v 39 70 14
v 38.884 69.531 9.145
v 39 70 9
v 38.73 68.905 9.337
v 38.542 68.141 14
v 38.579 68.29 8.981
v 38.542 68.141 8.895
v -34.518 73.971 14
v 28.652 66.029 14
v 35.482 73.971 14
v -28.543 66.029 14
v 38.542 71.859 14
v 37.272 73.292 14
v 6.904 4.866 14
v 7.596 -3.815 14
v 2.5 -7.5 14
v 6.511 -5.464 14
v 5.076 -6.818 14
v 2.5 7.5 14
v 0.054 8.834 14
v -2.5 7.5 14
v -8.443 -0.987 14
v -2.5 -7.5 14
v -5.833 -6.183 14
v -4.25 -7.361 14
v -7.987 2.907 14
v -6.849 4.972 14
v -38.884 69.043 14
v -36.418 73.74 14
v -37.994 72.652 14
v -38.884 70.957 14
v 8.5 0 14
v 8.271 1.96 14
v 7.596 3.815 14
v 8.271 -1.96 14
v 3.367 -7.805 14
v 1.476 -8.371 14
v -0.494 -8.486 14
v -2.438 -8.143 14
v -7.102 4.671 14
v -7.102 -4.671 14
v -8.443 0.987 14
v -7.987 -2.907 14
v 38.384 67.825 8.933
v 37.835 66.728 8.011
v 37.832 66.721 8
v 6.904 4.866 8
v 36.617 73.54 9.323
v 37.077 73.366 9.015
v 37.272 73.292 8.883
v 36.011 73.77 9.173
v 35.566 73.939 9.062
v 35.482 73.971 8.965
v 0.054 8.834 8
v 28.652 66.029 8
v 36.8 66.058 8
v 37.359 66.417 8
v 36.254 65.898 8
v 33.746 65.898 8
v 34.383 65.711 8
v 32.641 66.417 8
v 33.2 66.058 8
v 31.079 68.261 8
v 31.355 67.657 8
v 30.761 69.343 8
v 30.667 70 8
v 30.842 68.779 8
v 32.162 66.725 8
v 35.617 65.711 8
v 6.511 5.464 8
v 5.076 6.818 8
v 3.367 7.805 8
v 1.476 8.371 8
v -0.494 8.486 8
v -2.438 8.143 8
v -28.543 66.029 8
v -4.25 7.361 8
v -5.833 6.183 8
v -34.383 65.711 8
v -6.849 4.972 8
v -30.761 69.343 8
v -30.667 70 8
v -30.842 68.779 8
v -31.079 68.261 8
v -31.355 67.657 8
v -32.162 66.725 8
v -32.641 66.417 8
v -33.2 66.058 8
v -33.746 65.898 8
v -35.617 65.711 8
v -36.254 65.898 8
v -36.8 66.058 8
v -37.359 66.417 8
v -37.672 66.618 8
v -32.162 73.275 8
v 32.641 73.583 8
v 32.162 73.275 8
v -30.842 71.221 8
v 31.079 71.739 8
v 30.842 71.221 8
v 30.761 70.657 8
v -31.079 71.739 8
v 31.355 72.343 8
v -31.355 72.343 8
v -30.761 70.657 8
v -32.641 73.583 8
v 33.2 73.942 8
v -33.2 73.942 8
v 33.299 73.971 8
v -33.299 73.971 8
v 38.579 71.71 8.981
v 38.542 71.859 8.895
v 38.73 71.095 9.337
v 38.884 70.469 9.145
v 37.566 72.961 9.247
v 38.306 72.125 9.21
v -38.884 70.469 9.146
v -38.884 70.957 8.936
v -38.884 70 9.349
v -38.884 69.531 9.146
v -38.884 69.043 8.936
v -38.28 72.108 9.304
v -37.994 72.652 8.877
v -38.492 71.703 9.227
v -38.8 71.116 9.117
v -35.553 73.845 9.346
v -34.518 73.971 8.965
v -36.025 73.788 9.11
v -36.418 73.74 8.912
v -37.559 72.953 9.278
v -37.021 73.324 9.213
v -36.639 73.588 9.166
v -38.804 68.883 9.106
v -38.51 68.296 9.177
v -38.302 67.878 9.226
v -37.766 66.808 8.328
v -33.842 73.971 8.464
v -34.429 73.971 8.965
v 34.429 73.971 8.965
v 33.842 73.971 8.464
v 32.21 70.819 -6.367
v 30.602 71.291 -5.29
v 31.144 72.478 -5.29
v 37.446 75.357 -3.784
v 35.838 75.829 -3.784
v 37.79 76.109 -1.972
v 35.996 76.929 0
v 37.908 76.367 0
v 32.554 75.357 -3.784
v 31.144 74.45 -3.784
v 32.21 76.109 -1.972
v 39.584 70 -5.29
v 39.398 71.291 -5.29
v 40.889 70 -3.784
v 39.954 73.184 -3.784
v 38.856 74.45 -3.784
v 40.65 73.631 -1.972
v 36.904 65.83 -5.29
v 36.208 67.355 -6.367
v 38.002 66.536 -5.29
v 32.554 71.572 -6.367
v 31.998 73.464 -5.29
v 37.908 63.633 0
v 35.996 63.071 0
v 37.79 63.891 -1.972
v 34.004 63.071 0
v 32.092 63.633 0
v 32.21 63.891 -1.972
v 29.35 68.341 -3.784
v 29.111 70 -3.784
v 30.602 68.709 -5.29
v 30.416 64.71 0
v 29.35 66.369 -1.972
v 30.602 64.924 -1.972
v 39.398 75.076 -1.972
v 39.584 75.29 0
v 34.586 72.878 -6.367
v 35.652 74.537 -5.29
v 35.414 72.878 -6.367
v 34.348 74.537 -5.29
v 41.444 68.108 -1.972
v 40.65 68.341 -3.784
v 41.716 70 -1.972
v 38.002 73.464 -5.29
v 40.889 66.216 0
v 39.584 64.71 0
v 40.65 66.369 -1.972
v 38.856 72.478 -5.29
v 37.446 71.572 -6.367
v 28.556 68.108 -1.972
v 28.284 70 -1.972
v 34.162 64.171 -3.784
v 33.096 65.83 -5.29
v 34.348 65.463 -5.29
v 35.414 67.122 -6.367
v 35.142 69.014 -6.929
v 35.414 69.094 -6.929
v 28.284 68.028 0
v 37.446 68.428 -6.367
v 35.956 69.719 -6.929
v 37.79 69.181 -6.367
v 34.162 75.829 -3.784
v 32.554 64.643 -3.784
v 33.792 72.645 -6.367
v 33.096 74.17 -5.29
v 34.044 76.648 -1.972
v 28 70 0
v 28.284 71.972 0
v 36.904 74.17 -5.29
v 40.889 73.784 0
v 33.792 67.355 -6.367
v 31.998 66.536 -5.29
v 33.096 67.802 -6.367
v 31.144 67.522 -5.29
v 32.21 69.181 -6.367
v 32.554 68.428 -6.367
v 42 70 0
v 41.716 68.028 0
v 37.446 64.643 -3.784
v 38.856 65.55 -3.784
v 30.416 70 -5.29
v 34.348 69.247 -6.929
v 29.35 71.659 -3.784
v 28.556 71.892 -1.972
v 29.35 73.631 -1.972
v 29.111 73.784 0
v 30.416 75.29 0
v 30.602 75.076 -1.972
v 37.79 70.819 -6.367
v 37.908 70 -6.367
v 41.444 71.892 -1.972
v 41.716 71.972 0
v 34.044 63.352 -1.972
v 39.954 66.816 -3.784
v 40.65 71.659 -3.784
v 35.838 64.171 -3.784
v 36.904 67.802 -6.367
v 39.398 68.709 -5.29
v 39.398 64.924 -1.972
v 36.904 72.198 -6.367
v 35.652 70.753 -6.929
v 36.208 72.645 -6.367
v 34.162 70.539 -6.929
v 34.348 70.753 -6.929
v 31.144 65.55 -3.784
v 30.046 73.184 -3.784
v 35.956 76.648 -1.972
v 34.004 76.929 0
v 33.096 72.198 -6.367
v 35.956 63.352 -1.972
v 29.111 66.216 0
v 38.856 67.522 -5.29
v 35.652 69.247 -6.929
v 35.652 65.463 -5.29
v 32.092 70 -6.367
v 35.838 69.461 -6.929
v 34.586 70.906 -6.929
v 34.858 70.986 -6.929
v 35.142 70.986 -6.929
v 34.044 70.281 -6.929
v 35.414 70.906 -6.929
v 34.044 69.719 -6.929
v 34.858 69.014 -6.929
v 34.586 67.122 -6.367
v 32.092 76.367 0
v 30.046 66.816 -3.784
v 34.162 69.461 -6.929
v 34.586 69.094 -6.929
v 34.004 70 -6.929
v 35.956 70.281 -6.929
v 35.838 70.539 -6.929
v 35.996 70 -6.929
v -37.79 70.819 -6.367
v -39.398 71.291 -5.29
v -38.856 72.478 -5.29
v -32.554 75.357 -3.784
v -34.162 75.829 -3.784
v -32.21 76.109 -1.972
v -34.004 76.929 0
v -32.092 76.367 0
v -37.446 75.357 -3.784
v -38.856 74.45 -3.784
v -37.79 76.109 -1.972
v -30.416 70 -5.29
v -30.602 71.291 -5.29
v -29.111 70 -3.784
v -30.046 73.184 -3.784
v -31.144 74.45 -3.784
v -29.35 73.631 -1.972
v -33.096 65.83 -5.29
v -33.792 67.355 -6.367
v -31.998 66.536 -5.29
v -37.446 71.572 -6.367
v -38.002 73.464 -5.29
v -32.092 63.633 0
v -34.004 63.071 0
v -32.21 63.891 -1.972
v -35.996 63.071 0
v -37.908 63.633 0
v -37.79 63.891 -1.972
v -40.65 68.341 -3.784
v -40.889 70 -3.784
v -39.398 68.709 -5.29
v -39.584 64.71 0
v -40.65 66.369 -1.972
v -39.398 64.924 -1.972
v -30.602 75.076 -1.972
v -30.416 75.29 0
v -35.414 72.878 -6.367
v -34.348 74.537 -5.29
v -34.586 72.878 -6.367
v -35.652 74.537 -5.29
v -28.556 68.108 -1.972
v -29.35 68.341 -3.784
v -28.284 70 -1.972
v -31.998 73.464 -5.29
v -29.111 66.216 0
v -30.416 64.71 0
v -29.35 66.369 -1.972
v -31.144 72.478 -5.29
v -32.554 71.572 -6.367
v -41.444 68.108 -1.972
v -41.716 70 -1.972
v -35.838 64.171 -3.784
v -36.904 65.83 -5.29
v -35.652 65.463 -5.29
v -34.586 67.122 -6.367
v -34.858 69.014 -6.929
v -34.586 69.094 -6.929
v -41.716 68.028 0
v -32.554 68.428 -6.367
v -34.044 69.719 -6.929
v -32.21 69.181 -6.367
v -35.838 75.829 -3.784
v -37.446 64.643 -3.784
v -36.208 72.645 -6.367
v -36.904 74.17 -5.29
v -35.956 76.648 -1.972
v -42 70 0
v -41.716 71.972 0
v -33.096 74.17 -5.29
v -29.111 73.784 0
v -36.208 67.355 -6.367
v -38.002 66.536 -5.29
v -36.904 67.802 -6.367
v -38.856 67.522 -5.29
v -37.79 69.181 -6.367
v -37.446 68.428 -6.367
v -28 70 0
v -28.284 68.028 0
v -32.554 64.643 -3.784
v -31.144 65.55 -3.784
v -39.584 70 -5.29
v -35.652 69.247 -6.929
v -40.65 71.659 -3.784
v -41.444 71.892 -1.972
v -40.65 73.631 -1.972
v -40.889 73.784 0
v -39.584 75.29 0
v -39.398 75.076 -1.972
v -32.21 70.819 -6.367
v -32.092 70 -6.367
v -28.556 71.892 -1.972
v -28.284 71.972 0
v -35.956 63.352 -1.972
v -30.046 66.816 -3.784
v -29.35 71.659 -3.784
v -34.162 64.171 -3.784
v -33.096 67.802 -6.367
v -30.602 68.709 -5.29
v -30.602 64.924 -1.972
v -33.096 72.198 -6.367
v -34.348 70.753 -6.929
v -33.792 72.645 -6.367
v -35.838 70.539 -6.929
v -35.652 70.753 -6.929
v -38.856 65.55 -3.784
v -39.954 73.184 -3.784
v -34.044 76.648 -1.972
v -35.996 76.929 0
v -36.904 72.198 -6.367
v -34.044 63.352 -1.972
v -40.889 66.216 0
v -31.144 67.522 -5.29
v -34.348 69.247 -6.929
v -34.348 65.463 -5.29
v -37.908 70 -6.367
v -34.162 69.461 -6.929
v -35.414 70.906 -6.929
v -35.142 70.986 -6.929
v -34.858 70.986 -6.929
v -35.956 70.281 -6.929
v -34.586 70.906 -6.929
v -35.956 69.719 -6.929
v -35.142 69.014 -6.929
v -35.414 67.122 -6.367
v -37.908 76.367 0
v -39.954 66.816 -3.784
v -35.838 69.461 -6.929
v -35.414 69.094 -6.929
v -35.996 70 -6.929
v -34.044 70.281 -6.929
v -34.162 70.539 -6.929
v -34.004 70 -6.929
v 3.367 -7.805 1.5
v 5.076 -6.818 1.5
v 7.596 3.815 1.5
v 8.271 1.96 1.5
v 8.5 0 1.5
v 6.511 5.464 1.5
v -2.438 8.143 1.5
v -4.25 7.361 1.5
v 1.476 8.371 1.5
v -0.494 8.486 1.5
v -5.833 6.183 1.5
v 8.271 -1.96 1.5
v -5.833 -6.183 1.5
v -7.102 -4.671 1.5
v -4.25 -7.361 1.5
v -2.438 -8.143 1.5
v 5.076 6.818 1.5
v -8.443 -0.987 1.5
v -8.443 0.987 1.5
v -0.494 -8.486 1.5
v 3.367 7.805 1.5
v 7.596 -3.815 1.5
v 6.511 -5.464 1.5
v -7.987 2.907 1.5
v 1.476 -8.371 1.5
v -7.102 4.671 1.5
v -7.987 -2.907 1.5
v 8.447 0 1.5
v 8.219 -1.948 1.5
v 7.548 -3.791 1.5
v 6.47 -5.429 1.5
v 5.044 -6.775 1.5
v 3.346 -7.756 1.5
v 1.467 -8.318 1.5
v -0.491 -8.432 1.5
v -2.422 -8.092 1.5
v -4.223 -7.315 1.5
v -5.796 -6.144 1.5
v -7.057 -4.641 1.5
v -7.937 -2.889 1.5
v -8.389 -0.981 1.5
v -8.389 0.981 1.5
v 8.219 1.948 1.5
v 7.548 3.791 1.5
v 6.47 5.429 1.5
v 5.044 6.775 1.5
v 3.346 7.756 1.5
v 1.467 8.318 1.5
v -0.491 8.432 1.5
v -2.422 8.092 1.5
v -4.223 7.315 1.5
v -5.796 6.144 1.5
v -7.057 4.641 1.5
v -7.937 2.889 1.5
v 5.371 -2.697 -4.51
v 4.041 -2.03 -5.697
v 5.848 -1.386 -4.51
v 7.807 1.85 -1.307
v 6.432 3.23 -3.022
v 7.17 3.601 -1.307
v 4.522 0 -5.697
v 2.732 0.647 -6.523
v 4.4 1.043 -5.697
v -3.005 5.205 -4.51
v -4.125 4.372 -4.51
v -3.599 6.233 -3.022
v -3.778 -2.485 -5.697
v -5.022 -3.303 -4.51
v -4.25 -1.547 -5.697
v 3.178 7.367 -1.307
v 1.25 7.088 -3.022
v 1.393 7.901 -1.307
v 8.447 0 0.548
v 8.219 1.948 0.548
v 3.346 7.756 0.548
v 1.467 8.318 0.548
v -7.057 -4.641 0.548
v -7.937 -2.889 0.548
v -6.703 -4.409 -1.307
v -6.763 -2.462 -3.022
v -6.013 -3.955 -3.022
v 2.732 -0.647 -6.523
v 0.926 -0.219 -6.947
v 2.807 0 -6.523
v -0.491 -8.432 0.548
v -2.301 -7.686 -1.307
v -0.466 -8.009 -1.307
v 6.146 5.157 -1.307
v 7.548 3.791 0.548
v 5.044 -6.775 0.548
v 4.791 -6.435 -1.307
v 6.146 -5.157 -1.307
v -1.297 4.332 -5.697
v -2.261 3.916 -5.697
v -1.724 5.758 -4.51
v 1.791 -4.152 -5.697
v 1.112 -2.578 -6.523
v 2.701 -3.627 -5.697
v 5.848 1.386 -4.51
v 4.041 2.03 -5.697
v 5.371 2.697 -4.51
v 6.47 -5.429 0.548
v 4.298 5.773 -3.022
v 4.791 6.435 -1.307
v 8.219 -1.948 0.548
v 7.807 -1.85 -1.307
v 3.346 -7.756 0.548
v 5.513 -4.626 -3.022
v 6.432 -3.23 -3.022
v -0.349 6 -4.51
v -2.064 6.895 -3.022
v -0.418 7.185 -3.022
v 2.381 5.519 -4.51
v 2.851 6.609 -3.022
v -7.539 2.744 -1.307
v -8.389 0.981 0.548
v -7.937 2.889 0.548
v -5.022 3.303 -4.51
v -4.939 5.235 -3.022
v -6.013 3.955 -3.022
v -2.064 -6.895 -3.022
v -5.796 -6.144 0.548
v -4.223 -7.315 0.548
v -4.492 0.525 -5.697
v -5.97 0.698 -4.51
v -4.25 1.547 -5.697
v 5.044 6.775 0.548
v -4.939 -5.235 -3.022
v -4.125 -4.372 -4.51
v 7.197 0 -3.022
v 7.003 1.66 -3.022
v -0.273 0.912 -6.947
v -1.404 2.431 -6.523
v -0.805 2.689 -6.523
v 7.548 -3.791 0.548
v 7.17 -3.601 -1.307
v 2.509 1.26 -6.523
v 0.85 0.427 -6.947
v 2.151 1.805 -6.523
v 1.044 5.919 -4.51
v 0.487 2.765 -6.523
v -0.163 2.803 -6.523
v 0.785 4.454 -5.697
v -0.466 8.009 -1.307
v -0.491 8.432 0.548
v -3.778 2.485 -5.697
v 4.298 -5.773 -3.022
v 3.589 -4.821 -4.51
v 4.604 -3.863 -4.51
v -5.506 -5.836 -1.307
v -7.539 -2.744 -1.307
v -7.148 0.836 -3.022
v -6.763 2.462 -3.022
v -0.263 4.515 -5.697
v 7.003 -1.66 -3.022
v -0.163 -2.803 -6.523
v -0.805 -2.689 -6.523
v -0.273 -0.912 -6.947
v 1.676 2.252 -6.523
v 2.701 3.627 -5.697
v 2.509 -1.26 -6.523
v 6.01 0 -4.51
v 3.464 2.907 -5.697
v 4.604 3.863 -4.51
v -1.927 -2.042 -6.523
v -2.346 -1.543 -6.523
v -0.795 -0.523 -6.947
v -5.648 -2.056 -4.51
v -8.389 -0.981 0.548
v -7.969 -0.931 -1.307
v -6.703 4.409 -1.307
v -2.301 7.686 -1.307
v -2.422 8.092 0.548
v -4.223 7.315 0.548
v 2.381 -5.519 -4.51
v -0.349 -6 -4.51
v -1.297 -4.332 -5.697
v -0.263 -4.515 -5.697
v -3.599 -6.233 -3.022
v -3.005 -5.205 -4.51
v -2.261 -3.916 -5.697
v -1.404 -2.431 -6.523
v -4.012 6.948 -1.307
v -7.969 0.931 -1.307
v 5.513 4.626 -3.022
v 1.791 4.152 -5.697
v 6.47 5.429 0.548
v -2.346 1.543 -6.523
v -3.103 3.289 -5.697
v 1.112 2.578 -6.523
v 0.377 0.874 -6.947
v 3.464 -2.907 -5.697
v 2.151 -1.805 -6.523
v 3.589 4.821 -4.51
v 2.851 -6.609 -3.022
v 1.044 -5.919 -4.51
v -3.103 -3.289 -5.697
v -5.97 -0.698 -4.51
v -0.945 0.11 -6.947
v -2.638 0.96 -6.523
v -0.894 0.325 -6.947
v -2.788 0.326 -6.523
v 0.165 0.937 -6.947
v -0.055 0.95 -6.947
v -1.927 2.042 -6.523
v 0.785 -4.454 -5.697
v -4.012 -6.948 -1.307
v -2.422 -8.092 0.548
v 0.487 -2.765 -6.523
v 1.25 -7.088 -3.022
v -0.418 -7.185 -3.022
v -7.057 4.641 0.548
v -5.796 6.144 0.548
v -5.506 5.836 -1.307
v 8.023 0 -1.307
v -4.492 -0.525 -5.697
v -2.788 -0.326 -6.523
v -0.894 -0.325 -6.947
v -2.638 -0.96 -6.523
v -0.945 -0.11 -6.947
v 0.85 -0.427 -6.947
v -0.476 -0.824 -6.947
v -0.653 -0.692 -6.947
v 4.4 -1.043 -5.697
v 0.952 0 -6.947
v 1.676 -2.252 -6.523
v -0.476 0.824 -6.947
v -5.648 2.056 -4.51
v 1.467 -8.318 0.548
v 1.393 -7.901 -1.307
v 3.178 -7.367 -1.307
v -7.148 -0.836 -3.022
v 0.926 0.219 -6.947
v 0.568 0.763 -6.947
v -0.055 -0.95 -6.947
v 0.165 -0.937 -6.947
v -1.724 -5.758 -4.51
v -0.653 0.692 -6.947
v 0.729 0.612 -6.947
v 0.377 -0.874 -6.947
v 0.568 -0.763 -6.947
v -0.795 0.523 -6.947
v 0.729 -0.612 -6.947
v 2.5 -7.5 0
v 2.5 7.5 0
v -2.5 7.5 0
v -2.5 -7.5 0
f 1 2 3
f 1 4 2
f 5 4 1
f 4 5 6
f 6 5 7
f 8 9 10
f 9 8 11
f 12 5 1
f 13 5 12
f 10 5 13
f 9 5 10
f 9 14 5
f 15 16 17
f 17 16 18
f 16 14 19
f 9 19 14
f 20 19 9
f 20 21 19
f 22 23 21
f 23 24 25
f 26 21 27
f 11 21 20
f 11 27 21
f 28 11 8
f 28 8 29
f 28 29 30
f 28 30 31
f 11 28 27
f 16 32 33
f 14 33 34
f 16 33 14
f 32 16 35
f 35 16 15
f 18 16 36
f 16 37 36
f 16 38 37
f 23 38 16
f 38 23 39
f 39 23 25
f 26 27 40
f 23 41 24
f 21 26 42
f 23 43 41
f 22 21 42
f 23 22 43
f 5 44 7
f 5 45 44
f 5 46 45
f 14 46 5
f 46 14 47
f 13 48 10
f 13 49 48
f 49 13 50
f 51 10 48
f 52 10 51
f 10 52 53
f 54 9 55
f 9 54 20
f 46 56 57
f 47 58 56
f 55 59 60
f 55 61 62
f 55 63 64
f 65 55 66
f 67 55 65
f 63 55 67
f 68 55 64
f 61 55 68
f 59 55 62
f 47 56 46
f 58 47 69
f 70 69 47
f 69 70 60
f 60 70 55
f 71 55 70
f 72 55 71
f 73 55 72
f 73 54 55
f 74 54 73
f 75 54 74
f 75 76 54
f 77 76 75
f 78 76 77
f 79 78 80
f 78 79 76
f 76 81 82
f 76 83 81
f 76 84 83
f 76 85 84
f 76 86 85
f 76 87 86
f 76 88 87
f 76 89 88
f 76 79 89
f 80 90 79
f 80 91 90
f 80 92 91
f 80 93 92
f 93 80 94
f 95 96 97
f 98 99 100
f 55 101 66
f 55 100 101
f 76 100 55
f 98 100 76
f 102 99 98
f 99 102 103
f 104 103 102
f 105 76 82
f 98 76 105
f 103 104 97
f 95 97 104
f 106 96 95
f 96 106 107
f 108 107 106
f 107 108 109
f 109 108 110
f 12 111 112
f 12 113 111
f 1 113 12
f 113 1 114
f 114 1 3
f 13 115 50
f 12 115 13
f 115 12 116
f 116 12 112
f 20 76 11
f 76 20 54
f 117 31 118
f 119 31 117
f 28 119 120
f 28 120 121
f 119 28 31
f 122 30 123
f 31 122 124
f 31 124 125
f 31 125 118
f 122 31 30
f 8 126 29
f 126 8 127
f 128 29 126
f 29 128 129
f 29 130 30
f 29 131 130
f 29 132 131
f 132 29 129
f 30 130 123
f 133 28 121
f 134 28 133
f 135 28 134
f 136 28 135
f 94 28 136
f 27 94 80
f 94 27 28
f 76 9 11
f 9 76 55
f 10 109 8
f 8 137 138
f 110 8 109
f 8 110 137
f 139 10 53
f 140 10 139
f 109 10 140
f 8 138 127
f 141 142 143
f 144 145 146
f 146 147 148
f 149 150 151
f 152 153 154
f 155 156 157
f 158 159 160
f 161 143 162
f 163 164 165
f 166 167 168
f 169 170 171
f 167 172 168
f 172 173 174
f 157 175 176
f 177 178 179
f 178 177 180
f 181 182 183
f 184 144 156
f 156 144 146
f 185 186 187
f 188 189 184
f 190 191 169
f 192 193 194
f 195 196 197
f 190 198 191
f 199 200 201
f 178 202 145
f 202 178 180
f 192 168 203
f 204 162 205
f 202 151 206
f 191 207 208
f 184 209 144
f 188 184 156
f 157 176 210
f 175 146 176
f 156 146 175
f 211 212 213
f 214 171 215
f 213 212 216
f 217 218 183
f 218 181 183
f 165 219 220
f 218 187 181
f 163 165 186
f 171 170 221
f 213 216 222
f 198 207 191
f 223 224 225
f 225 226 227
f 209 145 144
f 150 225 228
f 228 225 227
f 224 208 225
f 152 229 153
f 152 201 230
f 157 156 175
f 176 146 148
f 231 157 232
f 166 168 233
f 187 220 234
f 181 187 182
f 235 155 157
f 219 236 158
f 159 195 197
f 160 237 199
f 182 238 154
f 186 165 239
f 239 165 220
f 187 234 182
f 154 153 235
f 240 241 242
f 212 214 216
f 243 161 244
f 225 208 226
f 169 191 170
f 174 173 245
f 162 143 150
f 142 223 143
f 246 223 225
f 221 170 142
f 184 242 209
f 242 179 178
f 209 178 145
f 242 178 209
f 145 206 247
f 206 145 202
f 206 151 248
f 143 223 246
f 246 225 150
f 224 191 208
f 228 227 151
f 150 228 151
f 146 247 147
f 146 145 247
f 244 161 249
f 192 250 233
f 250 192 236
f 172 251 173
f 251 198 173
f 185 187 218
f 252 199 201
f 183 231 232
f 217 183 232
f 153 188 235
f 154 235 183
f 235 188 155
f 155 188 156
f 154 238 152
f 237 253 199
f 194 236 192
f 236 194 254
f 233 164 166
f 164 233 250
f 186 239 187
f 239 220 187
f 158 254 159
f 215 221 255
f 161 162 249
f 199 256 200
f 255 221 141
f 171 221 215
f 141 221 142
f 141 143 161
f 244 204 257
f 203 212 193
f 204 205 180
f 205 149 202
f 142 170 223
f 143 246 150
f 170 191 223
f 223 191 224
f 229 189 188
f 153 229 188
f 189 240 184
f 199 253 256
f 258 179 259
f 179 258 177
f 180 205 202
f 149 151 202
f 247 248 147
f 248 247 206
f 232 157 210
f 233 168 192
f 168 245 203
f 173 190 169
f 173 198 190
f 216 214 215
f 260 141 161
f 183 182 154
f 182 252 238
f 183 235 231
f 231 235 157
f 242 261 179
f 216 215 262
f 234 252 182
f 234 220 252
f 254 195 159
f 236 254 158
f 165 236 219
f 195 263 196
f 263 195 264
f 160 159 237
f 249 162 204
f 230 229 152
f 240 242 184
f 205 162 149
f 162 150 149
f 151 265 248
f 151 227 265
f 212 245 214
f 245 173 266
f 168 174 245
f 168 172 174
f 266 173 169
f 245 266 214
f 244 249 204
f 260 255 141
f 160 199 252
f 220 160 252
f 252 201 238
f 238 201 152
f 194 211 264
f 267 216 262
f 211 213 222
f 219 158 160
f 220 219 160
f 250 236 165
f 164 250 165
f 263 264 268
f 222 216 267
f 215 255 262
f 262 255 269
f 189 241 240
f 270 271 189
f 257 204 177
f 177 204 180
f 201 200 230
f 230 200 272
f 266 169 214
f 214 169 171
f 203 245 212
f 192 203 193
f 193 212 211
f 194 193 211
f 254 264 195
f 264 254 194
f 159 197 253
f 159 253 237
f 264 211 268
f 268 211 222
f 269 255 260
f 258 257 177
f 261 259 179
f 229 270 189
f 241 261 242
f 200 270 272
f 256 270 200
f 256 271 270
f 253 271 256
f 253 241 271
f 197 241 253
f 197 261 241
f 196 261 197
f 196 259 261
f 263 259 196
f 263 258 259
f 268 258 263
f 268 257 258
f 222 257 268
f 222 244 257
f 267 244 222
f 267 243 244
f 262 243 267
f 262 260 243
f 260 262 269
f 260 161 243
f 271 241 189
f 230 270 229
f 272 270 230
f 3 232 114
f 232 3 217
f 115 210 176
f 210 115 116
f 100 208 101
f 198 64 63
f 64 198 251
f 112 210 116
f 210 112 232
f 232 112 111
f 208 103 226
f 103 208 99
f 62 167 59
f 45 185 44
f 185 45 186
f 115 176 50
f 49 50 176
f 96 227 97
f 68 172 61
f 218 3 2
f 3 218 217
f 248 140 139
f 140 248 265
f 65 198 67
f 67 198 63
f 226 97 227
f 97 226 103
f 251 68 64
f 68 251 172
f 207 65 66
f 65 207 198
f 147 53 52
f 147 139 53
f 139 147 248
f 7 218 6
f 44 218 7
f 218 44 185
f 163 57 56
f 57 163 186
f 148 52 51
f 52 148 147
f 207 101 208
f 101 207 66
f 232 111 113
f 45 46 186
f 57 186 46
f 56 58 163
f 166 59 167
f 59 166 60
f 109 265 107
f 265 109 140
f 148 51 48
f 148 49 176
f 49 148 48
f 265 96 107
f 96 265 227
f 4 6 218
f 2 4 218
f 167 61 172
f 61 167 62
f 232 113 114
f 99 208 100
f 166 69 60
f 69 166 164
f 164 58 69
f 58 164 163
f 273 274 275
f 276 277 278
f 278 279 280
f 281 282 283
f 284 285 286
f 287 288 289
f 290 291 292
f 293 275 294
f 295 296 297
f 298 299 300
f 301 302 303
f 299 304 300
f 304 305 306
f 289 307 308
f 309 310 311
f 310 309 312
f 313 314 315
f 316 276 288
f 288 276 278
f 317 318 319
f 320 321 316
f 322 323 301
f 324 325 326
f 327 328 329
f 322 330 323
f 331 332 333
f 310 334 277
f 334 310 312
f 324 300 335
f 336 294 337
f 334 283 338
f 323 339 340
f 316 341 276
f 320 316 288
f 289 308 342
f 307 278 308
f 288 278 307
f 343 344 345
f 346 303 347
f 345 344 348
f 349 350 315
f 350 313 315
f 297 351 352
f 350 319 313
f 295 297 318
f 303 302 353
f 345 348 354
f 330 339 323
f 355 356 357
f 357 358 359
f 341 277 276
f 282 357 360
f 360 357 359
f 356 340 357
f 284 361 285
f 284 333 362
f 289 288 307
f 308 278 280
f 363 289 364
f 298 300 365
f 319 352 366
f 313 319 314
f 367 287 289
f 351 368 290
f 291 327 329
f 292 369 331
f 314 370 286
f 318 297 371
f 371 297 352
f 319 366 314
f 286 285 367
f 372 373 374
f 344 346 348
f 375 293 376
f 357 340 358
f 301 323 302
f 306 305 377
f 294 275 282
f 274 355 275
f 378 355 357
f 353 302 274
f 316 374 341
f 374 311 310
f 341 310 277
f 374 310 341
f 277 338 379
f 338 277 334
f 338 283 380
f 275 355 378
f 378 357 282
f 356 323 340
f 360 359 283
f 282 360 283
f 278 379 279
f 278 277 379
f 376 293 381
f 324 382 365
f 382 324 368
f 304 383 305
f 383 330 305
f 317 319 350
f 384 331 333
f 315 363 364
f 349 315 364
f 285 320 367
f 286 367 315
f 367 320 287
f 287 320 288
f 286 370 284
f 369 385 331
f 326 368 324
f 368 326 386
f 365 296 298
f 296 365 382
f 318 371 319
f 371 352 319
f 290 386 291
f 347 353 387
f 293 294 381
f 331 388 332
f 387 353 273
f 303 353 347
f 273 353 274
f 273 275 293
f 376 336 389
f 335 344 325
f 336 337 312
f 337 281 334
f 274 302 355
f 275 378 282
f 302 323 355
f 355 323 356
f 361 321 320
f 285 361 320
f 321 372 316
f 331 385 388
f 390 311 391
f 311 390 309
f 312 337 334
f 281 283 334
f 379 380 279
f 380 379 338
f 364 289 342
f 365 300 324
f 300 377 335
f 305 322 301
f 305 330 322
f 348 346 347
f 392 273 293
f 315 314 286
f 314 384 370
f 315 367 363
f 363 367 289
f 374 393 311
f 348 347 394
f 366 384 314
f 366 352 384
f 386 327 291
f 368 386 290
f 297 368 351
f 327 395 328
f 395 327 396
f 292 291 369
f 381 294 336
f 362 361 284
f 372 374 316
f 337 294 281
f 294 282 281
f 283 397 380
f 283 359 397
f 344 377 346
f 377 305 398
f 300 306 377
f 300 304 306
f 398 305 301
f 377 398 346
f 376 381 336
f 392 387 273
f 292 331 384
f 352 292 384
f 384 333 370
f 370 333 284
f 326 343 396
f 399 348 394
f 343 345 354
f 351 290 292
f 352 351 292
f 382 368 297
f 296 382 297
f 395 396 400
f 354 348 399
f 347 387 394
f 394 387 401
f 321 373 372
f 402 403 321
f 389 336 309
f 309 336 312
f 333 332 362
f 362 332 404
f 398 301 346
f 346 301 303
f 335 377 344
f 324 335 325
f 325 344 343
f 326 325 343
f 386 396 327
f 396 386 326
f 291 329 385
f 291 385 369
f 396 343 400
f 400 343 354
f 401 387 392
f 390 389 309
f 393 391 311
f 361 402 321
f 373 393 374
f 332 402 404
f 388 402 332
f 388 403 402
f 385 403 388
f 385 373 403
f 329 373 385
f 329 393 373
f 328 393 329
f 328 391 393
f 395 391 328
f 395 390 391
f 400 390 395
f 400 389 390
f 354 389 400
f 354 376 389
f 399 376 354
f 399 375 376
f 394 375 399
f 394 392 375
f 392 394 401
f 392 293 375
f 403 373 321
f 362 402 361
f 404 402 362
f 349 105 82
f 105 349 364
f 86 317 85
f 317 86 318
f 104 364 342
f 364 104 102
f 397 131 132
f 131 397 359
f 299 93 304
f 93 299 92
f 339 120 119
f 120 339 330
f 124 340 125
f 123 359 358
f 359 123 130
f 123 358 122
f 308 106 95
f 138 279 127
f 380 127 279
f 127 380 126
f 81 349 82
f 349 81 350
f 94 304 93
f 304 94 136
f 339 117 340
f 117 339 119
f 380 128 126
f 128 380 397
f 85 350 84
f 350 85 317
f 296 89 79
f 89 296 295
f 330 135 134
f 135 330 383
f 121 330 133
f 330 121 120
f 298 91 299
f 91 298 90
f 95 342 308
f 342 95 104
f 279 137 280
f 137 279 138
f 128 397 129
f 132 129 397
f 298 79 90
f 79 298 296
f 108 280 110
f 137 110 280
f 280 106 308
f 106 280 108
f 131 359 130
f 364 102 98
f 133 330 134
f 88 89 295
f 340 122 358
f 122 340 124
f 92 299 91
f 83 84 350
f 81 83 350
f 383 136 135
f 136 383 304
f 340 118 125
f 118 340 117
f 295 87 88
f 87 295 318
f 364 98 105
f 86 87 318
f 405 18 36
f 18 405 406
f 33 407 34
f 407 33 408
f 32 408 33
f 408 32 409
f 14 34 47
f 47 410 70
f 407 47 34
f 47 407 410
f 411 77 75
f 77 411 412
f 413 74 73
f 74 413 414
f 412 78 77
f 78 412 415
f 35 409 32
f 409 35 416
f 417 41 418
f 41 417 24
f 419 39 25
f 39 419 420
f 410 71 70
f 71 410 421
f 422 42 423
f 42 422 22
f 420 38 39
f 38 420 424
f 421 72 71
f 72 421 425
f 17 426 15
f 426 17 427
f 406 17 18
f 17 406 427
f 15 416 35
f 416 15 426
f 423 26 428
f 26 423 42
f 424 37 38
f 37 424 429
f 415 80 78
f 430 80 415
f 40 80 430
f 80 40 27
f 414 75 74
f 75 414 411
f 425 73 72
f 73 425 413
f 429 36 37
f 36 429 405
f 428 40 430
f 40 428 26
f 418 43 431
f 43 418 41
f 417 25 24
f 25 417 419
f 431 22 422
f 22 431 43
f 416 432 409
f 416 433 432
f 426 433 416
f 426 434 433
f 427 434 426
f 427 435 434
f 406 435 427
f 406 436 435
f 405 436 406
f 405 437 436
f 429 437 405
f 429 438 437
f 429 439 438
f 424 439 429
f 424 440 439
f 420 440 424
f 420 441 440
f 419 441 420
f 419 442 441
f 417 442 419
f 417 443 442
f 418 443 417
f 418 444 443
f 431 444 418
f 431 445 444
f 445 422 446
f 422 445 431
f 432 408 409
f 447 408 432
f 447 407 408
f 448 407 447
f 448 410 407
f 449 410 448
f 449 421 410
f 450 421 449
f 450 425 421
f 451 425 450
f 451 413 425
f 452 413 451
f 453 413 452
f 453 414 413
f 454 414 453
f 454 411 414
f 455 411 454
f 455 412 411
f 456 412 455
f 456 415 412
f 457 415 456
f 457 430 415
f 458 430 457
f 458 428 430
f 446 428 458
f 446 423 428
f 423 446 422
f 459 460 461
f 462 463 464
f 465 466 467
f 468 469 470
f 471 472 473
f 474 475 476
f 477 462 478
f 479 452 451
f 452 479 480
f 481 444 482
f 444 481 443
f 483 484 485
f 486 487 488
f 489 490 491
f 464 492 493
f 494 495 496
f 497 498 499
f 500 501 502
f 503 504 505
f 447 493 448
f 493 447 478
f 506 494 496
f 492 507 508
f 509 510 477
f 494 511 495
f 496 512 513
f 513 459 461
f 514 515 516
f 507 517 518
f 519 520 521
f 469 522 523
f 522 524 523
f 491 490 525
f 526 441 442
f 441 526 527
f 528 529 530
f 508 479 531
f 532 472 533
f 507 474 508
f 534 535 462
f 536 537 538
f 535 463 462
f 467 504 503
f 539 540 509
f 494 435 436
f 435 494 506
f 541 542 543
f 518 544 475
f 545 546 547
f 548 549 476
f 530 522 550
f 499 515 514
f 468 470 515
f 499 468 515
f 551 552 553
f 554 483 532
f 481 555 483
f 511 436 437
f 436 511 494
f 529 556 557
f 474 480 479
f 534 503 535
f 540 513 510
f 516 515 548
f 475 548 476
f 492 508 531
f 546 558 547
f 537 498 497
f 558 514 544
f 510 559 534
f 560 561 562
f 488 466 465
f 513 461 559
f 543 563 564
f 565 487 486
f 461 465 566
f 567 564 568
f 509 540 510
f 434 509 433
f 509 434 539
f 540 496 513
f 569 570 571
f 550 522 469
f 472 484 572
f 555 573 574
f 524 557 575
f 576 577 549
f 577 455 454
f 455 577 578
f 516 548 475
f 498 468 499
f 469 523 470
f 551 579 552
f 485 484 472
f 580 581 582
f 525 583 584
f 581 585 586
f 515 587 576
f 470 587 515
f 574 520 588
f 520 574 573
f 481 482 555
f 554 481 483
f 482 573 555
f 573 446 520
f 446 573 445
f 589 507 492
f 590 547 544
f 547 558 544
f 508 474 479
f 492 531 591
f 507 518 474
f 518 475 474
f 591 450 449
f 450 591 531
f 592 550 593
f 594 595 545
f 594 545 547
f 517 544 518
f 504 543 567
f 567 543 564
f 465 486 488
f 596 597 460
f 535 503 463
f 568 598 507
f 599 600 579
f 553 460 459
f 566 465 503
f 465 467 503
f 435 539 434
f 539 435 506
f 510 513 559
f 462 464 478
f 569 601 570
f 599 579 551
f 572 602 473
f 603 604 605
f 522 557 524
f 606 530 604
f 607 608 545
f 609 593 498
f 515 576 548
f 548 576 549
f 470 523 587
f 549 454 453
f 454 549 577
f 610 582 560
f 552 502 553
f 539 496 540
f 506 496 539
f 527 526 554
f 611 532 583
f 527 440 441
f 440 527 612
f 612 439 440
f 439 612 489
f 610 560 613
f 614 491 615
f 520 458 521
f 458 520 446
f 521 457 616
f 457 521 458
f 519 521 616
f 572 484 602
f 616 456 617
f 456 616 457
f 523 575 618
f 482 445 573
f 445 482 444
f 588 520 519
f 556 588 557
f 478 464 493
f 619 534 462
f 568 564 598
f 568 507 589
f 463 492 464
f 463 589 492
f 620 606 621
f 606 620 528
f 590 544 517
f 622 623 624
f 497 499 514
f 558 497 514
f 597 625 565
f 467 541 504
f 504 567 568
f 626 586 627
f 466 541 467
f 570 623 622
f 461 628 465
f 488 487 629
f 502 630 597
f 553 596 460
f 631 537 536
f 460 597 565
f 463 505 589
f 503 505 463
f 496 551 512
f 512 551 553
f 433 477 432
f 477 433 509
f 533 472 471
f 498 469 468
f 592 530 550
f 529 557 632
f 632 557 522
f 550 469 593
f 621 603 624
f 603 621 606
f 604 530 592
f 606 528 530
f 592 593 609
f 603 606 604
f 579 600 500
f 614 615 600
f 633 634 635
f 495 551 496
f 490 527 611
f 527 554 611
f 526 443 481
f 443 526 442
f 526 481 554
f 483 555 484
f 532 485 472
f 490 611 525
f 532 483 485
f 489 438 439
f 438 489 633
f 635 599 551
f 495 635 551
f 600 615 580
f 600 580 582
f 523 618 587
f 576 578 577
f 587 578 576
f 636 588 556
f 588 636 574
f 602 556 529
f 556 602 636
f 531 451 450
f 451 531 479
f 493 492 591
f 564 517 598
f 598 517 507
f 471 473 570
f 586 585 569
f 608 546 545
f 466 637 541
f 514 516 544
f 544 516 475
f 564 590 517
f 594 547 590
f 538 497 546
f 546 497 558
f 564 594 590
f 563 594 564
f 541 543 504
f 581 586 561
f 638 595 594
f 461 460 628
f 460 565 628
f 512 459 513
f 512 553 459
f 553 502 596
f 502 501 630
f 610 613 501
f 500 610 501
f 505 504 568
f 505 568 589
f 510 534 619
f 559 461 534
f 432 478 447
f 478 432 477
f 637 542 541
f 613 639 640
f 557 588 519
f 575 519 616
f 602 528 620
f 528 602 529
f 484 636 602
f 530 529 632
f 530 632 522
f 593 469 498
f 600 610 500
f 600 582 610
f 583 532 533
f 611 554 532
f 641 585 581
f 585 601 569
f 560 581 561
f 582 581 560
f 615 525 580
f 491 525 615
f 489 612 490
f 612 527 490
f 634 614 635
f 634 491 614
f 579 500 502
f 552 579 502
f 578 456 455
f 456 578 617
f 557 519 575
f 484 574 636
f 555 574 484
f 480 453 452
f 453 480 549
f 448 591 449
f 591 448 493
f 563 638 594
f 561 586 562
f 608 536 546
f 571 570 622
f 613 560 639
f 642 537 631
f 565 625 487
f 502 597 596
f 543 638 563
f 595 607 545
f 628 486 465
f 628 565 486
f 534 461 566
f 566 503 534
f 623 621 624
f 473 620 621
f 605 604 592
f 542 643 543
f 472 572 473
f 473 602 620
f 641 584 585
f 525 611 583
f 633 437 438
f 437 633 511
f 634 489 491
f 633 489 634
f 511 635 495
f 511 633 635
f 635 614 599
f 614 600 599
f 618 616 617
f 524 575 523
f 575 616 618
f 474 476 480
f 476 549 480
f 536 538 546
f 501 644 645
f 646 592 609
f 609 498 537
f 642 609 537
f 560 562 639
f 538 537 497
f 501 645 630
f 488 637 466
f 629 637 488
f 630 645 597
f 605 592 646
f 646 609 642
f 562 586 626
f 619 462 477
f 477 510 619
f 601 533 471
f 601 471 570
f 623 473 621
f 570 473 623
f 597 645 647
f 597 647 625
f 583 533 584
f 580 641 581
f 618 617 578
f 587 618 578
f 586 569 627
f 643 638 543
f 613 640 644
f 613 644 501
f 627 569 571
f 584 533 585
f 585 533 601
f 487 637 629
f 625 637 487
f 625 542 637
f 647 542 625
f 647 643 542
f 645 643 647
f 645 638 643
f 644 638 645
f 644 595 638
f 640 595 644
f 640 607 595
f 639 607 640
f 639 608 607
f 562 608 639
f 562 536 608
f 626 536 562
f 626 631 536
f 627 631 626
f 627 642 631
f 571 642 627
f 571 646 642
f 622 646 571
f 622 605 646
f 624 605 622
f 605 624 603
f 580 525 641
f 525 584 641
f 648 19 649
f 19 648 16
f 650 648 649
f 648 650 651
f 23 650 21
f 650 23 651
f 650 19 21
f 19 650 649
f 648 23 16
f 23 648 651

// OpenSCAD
/*
    ornamentBase.scad contains the base of the related ornament holder
    Copyright (C) 2022  Robert Daniel Berne

    This program is free software: you can redistribute it and/or modify
    it under the terms of the GNU General Public License as published by
    the Free Software Foundation, either version 3 of the License, or
    (at your option) any later version.

    This program is distributed in the hope that it will be useful,
    but WITHOUT ANY WARRANTY; without even the implied warranty of
    MERCHANTABILITY or FITNESS FOR A PARTICULAR PURPOSE.  See the
    GNU General Public License for more details.

    You should have received a copy of the GNU General Public License
    along with this program.  If not, see <http://www.gnu.org/licenses/>.
*/

echo ("    ornamentBase.scad  Copyright (C) 2022  Robert Daniel Berne

    This program comes with ABSOLUTELY NO WARRANTY;
    This is free software, and you are welcome to redistribute it
    under certain conditions. See the GNU GPL for more details.");


module holderFoot(){
    a=15;
    b=5;
    c=15;
translate([-b/2,(-a/2),0])
    cube([b,a,c]);
}

module foot(x=0,y=0,ankle=0){
    
    if(ankle==1){
        translate([x,y,8])
        cylinder(d=8,h=6);
    }else{//bottom of foot
        
        translate([x,y])
        cylinder(d1=14,d2=6,h=12);
        
        translate([x,y])
        difference(){
            sphere(d=14);
            translate([-9,-9])
            cube([18,18,18]);
        }
    }
}

module base(){
    union(){
        hull(){
            foot(ankle=1);
            foot(35,70,1);
        }
        hull(){
            foot(ankle=1);
            foot(-35,70,1);
            
        }
        hull(){
            foot(35,70,1);
            foot(-35,70,1);
            
        }
    }
    //foot();
    foot(35,70);
    foot(-35,70);
    translate([0,0,1.5])
    cylinder(d=17,h=12.5);
    translate([0,0,1.5])
    sphere(d=17);
    
}
difference(){
    base();
    holderFoot();
    
}
